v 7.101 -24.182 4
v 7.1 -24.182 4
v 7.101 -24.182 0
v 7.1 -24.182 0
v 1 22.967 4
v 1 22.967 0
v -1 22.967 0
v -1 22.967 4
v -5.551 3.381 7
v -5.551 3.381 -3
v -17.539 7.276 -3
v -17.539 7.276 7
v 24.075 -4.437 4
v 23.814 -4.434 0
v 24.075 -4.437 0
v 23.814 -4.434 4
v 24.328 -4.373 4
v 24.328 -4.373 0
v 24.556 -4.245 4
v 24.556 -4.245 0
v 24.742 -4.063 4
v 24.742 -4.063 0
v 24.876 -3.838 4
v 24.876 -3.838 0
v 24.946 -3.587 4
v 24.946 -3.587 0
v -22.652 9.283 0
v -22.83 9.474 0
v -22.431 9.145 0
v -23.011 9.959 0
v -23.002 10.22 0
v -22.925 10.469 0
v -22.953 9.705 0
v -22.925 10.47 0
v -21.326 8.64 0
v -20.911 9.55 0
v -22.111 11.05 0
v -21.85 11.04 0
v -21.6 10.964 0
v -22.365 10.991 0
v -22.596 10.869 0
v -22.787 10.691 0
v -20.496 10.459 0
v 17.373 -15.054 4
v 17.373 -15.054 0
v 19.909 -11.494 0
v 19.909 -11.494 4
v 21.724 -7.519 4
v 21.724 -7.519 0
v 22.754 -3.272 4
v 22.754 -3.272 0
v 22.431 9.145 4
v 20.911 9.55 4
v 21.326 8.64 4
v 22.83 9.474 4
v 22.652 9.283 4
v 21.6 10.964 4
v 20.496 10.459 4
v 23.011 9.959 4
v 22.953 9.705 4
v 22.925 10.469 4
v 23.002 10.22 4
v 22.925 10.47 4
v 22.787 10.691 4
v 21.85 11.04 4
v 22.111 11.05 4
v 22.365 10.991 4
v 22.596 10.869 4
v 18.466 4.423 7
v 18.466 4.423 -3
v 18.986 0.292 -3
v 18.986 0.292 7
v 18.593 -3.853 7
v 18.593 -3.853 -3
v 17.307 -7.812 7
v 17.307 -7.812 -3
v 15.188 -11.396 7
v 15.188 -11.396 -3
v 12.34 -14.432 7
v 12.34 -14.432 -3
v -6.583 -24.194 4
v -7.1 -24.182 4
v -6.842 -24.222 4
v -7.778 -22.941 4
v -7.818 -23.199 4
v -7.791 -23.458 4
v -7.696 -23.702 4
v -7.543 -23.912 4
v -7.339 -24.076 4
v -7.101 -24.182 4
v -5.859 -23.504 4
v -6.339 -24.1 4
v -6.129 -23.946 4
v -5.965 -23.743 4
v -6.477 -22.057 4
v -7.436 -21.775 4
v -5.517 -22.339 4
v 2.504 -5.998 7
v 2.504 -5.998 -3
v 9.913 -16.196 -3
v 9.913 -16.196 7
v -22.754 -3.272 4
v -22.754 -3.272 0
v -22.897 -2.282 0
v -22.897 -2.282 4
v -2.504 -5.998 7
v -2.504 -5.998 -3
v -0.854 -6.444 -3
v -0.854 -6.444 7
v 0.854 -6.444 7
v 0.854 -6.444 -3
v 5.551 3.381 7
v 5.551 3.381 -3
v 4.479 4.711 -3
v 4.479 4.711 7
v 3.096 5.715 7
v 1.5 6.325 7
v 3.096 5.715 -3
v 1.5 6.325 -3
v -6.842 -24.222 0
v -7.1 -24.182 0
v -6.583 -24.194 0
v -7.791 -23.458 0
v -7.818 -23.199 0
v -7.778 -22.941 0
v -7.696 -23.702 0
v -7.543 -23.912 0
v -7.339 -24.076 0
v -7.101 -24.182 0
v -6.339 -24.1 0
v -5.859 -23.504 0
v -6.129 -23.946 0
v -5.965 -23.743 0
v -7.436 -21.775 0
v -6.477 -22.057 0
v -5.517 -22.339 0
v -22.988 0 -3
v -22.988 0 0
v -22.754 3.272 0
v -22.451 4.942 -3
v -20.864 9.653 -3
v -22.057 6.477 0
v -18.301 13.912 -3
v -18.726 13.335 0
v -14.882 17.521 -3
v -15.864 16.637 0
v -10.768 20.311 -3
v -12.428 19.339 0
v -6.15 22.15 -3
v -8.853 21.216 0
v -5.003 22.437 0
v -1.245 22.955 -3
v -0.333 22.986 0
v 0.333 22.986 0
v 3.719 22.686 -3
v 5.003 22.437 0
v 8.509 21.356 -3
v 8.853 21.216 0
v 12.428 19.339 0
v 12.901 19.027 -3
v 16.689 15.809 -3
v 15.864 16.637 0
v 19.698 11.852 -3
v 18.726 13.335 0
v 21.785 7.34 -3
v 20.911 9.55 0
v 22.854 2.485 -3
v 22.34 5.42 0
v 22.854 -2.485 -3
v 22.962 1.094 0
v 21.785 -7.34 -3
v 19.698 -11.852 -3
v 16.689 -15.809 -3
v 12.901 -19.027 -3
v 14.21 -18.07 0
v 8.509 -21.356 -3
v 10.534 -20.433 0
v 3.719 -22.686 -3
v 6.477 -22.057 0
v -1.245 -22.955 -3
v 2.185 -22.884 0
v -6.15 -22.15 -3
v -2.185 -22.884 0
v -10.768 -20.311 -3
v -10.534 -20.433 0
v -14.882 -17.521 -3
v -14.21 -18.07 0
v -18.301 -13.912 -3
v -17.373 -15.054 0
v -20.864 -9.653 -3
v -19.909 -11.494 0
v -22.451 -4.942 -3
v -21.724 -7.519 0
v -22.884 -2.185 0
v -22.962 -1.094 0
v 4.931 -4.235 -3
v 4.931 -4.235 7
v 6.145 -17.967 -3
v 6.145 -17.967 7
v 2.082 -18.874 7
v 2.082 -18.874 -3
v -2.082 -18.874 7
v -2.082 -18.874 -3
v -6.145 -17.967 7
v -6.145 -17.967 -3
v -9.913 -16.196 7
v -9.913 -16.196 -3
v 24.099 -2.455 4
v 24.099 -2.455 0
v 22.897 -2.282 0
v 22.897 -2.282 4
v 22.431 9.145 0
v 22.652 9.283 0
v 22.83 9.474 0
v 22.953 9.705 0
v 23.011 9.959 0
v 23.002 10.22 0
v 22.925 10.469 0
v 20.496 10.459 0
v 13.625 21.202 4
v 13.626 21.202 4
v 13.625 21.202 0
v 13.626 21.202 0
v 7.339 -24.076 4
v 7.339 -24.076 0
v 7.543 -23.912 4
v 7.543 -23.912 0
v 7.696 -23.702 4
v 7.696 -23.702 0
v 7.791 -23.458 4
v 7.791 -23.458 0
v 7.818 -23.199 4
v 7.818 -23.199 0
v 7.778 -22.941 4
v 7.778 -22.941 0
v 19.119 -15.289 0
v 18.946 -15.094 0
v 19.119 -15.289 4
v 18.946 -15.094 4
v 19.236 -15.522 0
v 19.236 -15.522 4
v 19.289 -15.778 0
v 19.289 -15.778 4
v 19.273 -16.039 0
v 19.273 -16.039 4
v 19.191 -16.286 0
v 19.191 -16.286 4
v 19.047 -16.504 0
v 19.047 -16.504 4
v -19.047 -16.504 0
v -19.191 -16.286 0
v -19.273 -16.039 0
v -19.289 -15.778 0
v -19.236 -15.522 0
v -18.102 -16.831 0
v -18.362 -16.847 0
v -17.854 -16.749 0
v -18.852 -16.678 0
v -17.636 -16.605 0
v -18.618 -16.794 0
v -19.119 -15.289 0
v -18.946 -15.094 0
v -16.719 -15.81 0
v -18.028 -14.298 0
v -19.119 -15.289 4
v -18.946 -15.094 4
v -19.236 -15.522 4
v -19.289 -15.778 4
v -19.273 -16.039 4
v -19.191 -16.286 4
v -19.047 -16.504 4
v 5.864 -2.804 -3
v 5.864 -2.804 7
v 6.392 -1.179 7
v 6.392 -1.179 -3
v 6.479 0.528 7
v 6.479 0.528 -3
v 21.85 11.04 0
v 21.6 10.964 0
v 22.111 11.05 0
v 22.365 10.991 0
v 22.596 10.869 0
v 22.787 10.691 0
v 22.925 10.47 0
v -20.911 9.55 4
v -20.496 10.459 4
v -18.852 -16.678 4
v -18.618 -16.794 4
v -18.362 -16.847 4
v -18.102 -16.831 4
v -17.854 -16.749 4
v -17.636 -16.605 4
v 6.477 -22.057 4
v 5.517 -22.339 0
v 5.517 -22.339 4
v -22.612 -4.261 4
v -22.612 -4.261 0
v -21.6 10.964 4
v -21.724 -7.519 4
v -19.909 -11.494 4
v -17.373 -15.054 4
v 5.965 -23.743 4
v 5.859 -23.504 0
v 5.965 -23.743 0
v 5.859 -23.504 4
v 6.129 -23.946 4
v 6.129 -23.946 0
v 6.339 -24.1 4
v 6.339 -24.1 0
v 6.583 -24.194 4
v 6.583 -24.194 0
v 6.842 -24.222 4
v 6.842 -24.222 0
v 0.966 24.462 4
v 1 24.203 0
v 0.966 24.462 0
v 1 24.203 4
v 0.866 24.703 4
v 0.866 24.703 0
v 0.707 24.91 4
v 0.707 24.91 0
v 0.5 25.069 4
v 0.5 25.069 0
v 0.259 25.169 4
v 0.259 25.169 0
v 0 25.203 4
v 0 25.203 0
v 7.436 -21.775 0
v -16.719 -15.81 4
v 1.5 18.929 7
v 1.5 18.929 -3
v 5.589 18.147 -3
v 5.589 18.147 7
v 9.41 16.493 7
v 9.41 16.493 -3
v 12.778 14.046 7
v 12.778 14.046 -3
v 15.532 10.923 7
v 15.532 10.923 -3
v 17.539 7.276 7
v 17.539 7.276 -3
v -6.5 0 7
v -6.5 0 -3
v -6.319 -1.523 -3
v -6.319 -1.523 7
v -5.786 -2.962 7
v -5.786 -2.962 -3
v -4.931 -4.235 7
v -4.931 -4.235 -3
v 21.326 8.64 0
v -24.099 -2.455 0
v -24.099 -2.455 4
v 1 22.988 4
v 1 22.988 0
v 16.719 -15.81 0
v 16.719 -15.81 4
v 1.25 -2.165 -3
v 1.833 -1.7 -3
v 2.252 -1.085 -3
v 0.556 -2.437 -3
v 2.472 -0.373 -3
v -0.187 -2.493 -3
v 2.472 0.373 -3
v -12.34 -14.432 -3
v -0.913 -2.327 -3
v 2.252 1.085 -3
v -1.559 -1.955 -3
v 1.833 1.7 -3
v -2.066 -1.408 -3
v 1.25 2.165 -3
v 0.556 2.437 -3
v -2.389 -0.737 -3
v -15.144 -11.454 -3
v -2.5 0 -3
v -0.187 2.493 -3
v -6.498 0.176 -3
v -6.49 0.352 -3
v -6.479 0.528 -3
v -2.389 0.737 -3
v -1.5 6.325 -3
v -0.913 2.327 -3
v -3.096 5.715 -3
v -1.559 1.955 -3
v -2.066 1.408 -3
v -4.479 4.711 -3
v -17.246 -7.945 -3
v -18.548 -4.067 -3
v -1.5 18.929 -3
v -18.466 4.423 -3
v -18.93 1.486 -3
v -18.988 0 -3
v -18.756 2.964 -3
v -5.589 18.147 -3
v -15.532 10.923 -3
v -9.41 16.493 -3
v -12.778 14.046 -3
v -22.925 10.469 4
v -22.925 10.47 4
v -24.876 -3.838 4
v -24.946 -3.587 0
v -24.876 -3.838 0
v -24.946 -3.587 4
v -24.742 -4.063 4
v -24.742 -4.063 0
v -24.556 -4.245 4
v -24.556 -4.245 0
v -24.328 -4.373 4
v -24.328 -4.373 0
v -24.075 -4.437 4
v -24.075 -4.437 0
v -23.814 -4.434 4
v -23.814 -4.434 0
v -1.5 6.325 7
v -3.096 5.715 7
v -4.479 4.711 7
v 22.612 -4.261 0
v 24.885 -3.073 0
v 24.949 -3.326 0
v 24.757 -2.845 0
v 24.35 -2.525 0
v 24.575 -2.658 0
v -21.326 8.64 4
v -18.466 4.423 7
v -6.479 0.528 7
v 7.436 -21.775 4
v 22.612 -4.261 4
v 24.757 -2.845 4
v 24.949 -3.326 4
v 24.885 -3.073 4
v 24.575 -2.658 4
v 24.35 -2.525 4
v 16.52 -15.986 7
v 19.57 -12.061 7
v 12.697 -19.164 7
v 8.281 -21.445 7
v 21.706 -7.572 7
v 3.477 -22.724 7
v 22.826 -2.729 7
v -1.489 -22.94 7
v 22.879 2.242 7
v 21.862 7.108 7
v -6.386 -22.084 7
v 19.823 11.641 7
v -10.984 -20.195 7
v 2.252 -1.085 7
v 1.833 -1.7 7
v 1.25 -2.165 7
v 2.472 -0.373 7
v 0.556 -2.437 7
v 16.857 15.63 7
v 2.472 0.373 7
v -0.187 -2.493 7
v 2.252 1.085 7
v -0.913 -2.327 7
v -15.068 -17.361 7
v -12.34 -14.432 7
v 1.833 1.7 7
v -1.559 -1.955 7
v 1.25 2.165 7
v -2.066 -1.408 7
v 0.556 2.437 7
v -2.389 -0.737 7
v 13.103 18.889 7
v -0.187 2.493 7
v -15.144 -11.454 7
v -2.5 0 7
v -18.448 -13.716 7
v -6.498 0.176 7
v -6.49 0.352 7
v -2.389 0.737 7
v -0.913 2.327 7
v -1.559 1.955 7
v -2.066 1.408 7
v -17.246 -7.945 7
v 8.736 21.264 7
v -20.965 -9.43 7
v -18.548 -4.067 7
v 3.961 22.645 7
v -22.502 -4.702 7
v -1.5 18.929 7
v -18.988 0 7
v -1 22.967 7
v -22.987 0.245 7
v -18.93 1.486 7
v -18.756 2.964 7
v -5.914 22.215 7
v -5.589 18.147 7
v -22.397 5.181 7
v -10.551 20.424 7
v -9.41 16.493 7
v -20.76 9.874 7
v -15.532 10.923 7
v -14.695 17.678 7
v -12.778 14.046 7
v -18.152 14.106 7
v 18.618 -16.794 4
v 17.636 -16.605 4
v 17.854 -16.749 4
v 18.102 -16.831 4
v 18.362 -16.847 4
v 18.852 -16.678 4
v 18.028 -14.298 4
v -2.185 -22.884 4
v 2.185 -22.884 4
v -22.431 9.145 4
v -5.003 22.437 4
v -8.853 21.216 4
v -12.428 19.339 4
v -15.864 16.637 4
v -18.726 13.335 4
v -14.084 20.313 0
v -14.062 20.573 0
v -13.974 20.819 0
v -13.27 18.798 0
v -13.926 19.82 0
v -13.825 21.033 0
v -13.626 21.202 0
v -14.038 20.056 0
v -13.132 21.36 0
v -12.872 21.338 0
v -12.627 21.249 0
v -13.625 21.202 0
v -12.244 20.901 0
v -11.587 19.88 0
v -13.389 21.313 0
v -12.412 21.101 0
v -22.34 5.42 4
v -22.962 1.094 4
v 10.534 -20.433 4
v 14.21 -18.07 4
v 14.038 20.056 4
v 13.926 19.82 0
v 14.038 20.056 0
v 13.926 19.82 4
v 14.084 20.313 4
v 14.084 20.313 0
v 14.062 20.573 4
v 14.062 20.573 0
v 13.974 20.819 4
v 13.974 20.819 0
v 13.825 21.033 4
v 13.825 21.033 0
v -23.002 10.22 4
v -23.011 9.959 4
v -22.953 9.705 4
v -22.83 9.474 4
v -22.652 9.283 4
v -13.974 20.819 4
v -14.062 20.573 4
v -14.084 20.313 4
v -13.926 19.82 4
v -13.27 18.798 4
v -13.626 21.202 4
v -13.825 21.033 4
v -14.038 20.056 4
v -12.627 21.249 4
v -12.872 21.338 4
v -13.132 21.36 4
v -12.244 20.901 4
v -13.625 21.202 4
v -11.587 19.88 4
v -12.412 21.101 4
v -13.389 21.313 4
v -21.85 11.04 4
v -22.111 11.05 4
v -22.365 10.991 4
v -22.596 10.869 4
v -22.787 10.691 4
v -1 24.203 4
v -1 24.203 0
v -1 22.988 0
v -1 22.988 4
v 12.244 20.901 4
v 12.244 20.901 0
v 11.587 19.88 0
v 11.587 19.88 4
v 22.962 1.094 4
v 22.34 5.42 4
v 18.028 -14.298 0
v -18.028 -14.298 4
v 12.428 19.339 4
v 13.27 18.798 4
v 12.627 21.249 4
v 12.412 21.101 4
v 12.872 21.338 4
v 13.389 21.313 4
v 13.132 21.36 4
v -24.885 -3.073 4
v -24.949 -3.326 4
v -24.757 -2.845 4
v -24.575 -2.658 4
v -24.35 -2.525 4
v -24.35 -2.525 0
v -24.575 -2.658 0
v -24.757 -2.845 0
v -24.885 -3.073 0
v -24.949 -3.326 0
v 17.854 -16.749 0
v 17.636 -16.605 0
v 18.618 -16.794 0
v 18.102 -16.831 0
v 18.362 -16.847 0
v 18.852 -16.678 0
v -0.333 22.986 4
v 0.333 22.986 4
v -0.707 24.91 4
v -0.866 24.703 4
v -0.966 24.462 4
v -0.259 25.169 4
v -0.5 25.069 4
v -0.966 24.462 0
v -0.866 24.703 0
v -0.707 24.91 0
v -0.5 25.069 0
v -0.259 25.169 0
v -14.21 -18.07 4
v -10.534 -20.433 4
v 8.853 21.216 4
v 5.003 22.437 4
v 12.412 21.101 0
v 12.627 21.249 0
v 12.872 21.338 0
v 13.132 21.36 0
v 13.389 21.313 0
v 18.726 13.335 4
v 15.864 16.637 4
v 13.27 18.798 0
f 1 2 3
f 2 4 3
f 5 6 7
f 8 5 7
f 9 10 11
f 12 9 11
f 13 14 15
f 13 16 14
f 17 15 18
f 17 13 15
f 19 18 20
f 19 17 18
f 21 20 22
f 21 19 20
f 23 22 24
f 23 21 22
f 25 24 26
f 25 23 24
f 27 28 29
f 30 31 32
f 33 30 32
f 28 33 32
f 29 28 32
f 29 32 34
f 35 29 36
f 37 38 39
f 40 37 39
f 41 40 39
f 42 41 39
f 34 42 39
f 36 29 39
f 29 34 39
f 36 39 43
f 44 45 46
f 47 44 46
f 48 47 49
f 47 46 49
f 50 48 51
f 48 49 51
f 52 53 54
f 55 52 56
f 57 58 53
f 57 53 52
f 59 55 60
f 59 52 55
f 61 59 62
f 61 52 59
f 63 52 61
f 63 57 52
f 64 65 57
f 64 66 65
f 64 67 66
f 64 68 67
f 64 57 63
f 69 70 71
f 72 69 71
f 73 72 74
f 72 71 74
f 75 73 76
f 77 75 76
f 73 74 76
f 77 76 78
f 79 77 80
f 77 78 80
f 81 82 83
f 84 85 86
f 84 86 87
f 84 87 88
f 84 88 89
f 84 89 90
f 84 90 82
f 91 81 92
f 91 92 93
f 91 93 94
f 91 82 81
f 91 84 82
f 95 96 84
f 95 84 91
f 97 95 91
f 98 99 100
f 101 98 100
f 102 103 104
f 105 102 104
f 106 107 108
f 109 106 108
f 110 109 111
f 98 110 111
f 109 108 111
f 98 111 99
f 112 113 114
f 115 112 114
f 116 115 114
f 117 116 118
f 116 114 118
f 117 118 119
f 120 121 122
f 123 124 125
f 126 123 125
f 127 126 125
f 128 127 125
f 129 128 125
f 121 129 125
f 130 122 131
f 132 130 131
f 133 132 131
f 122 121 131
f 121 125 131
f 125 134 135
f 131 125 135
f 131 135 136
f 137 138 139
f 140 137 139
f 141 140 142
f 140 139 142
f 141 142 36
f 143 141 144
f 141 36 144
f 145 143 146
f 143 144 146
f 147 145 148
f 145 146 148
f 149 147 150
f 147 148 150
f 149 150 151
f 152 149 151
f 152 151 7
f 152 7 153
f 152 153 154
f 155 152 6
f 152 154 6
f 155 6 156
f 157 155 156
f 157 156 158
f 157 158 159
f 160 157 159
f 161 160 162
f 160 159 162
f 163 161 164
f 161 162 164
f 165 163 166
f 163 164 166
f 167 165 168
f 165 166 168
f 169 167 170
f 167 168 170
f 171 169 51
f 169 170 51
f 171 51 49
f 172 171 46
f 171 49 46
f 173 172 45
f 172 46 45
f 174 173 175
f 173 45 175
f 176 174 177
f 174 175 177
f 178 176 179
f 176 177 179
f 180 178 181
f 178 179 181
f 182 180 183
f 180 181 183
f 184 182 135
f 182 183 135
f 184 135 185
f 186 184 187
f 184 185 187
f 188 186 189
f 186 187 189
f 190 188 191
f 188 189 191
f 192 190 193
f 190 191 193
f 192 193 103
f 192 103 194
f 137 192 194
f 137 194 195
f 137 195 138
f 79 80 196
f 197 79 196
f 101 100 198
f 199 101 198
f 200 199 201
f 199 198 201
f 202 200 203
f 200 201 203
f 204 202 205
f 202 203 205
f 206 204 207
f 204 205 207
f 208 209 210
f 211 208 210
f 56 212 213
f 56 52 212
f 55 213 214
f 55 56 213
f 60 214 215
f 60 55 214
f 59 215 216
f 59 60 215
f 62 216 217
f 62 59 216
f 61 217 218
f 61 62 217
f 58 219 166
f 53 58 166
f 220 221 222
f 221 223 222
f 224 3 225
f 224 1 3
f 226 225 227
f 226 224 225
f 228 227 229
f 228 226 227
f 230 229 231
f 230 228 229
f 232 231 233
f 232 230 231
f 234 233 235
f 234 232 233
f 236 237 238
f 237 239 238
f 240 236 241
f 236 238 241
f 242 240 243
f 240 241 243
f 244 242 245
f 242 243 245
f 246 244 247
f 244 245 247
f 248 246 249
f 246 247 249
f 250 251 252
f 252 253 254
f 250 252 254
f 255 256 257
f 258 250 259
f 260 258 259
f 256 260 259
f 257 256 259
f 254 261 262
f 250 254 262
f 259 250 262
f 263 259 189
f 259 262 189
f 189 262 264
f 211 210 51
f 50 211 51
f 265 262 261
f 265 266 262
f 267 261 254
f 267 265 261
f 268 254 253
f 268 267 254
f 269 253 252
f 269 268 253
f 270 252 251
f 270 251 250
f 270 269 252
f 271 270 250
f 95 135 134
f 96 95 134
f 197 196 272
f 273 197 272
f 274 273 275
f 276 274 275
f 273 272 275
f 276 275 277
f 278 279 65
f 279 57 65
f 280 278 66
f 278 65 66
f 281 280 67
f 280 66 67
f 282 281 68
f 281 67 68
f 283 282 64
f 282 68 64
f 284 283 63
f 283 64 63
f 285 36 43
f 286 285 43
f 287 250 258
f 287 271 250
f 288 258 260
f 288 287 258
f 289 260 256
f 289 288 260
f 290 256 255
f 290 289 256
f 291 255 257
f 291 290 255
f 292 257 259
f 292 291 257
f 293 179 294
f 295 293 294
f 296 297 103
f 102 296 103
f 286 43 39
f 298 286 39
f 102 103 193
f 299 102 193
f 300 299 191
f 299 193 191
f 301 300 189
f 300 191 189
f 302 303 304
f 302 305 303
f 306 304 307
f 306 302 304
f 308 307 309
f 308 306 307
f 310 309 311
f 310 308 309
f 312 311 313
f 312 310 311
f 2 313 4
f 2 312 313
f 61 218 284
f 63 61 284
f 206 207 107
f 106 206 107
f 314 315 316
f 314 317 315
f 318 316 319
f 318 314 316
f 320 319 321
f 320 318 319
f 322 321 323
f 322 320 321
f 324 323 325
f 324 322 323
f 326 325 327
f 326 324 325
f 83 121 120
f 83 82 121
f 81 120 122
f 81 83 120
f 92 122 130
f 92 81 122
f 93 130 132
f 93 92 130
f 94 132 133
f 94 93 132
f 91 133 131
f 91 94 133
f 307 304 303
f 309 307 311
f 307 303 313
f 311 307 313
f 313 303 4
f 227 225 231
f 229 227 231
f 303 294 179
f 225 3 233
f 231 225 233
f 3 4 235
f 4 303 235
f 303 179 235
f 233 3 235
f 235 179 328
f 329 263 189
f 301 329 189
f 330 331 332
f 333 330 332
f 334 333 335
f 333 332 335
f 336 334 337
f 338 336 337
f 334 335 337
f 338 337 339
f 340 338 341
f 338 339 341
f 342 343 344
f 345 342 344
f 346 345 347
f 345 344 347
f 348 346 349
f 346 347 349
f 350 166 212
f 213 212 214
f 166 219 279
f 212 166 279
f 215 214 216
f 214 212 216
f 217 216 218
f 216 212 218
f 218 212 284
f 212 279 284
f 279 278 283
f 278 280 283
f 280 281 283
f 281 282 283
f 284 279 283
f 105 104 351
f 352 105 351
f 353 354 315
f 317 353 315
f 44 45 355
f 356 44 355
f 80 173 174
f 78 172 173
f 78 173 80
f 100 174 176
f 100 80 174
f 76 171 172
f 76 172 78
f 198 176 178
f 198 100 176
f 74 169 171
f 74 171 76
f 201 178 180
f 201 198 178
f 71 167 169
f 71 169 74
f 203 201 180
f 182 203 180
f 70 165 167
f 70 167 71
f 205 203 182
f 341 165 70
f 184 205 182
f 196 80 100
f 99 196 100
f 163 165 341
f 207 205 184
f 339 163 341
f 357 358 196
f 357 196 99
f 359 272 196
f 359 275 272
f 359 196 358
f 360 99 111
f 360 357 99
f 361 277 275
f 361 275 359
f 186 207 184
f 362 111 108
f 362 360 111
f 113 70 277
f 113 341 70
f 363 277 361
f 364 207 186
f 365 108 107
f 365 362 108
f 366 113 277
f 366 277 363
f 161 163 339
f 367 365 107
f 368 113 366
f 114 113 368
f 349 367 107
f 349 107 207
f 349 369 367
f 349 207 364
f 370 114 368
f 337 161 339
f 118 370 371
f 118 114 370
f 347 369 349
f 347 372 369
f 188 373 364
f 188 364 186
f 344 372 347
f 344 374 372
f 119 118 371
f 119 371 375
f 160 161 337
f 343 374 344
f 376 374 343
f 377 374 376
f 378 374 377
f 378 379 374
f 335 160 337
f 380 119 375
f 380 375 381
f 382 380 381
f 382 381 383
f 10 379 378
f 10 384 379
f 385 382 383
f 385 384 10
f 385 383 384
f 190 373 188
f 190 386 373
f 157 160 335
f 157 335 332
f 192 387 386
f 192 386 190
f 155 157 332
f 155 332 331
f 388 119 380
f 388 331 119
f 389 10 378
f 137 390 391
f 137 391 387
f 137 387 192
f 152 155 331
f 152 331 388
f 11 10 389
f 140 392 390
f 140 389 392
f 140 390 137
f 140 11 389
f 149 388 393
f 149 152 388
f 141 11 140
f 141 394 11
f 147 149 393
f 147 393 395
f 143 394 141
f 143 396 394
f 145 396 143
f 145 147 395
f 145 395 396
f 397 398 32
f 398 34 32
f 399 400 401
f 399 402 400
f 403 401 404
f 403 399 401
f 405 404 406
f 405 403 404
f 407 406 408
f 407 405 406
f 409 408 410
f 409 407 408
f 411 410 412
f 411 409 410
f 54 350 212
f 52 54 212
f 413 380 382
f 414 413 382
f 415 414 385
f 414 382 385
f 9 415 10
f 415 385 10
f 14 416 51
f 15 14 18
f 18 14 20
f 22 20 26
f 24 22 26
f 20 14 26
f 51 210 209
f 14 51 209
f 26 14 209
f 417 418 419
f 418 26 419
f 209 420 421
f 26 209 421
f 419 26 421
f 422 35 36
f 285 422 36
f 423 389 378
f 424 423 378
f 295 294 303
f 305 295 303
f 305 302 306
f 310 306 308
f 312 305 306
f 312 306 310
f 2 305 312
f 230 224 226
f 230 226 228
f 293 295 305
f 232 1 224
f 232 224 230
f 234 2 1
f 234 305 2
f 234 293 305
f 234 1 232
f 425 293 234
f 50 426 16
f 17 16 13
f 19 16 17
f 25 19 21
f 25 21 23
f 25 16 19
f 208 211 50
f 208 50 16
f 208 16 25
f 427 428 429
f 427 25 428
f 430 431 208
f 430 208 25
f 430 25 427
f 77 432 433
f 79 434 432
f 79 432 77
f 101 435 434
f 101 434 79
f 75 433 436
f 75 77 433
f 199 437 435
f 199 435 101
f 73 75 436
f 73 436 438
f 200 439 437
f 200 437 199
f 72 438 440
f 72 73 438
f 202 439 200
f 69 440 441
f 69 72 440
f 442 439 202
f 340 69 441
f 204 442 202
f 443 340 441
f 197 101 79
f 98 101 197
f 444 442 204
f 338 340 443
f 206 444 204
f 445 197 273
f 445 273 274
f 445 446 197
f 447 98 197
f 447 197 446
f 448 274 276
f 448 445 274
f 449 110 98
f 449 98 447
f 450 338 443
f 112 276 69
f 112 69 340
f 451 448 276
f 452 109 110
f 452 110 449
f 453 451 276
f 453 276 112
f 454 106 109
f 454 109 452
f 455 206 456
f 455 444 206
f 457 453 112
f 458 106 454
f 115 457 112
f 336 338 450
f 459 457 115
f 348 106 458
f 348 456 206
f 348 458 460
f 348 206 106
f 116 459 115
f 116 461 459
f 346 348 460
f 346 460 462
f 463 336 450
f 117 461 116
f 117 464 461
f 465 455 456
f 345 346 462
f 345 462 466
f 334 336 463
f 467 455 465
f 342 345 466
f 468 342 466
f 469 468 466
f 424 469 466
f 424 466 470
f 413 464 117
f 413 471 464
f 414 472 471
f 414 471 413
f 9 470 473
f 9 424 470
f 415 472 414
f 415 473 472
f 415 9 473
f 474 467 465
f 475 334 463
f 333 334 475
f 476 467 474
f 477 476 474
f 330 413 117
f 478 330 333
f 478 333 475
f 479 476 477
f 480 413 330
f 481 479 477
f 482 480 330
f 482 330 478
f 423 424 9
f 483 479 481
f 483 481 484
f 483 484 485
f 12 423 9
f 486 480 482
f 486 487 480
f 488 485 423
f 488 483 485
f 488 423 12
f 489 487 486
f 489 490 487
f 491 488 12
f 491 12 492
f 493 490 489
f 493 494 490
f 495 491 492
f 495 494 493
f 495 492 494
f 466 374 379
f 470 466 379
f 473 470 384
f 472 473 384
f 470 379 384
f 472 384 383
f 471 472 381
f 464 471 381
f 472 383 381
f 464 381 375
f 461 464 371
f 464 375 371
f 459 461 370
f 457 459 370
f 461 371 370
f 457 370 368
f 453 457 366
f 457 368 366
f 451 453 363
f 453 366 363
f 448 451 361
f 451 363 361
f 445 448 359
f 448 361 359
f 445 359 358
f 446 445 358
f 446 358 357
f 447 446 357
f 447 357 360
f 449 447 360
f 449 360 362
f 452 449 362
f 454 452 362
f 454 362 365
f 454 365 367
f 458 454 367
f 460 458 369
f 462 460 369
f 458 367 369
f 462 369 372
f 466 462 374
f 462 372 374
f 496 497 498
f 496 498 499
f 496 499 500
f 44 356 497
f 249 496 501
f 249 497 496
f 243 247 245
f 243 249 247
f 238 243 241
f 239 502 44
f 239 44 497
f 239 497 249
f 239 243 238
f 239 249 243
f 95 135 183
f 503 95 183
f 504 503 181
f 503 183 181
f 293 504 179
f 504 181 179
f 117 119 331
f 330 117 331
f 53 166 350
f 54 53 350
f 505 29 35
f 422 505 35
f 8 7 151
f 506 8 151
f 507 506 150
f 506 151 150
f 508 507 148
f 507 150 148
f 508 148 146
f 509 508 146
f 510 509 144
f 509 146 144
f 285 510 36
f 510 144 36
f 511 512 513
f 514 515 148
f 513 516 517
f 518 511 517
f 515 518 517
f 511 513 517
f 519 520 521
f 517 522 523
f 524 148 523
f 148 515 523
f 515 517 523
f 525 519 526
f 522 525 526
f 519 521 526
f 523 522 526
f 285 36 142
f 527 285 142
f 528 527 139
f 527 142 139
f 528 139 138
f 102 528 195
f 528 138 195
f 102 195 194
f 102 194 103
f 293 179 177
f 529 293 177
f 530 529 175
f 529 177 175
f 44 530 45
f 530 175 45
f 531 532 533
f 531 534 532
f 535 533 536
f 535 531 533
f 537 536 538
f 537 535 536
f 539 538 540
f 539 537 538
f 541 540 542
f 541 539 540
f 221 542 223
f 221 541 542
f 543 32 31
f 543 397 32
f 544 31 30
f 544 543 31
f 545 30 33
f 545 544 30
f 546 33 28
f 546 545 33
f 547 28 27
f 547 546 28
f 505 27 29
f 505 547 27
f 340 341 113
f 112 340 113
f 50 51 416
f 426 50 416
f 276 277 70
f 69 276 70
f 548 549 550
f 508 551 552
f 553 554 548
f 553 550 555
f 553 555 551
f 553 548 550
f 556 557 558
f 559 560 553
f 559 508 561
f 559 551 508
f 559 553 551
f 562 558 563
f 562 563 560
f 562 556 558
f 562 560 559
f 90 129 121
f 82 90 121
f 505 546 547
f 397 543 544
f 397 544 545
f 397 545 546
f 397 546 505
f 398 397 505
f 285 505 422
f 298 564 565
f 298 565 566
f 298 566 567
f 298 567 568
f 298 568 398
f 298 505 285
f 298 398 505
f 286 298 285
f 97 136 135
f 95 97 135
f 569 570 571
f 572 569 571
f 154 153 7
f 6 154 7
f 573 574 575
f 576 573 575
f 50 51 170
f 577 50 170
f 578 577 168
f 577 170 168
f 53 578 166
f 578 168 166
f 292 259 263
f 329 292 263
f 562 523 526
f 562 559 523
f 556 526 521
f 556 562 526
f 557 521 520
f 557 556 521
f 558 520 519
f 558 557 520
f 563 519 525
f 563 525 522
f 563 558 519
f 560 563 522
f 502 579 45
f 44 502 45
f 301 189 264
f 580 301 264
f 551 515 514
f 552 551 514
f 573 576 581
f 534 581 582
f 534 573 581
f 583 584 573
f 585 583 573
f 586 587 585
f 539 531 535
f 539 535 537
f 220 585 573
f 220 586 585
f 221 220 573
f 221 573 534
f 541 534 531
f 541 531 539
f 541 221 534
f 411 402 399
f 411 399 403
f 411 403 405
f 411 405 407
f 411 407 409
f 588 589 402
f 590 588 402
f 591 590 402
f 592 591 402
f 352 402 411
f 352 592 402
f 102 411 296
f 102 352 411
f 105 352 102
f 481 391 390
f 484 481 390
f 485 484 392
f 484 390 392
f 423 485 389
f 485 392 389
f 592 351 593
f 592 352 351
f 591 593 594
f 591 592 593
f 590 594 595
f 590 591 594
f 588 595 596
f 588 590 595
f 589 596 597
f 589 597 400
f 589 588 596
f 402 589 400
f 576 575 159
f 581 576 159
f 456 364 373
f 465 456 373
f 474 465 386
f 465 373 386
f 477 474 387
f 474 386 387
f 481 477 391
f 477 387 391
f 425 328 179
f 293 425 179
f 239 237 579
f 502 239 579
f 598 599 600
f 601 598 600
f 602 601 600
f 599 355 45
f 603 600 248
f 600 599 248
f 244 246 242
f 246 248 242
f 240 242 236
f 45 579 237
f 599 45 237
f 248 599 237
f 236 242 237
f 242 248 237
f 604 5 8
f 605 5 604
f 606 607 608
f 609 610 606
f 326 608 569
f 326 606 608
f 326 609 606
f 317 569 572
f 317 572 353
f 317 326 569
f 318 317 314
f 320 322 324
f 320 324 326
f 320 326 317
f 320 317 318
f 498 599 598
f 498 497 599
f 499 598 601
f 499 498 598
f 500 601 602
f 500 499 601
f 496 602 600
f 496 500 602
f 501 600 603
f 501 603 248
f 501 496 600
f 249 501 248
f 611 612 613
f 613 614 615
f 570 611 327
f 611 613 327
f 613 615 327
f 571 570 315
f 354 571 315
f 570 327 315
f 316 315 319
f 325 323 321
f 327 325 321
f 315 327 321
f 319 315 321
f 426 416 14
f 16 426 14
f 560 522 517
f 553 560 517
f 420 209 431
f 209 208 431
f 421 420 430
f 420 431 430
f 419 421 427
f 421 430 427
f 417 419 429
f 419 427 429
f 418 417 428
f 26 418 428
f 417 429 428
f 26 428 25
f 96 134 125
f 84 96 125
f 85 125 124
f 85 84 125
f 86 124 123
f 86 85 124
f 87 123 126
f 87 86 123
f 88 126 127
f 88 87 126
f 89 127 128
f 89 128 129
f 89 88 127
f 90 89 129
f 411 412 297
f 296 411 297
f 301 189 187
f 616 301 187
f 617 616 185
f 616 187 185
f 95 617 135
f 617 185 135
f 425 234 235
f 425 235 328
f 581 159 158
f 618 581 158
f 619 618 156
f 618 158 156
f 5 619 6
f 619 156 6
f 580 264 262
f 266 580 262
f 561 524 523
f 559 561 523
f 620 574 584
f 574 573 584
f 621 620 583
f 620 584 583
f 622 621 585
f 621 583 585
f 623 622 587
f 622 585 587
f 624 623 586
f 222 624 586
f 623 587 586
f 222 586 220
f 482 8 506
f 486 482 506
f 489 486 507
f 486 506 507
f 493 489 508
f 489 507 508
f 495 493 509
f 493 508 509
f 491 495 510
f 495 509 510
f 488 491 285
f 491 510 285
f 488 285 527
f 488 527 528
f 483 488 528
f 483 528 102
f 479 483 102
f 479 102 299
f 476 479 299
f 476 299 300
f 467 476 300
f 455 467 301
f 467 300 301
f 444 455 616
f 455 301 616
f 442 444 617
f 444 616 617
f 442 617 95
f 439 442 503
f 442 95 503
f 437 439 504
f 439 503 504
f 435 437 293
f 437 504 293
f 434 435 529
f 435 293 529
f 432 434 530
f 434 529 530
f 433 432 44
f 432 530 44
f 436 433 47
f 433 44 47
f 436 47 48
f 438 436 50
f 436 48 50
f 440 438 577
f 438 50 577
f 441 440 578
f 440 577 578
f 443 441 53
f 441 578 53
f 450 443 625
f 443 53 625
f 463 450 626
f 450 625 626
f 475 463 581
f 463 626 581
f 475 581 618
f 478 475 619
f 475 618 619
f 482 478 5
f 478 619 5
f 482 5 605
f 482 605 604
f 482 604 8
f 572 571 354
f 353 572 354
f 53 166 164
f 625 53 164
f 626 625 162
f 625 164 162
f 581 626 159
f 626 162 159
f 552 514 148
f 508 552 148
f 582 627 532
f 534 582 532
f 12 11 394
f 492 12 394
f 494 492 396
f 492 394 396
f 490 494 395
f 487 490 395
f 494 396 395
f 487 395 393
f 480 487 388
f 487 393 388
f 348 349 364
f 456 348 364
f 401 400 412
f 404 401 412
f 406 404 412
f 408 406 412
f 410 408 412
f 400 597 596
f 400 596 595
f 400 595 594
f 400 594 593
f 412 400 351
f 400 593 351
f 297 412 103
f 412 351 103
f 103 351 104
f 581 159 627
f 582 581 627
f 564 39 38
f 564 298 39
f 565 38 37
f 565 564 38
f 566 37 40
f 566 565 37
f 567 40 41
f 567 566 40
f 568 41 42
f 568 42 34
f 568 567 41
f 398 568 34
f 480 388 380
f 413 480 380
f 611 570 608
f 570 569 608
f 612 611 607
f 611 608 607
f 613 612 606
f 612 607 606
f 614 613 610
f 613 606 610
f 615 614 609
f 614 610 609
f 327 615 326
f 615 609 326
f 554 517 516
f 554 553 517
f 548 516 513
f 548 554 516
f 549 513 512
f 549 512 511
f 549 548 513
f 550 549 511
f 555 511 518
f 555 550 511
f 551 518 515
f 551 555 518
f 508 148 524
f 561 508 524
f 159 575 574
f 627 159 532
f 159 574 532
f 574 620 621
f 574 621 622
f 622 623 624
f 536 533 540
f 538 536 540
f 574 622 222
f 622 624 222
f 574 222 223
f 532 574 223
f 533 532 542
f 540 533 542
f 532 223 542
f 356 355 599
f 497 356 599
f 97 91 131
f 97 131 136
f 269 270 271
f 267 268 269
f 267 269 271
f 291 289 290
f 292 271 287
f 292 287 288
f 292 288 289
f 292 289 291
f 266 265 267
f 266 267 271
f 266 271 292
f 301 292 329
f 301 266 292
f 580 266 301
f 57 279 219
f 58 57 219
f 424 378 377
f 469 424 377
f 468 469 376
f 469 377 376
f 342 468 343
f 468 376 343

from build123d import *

# Parameters (mm, degrees)
BOSS_EXTRUDE1_DEPTH    = 4
BOSS_EXTRUDE1_2_DEPTH  = 4
BOSS_EXTRUDE1_3_DEPTH  = 4
BOSS_EXTRUDE1_4_DEPTH  = 4
BOSS_EXTRUDE1_5_DEPTH  = 4
BOSS_EXTRUDE1_6_DEPTH  = 4
BOSS_EXTRUDE1_7_DEPTH  = 4
BOSS_EXTRUDE1_8_DEPTH  = 4
BOSS_EXTRUDE1_9_DEPTH  = 4
BOSS_EXTRUDE1_10_DEPTH = 4
BOSS_EXTRUDE1_11_DEPTH = 4
BOSS_EXTRUDE1_12_DEPTH = 4
SKETCH5_R              = 22.988388863
BOSS_EXTRUDE3_DEPTH    = 3
SKETCH6_R              = 22.988388863
BOSS_EXTRUDE4_DEPTH    = 3
SKETCH7_R              = 2.5
CUT_EXTRUDE1_DEPTH     = 10
CUT_EXTRUDE2_DEPTH     = 10
FILLET1_R              = 1
FILLET2_R              = 1
FILLET3_R              = 1
FILLET4_R              = 1
FILLET5_R              = 1
FILLET6_R              = 1
FILLET7_R              = 1
FILLET8_R              = 1
FILLET9_R              = 1
FILLET10_R             = 1
FILLET11_R             = 1


with BuildPart() as part:
    # Sketch2 → Boss-Extrude1 (new body)
    with BuildSketch(Plane.XY):
        with BuildLine():
            Line((-1, 24.966628453), (-1, 22.988388863))
            Line((-1, 22.988388863), (1, 22.988388863))
            Line((1, 22.988388863), (1, 24.966628453))
            ThreePointArc((1, 24.966628453), (0, 25.20269643), (-1, 24.966628453))
        make_face()
    extrude(amount=BOSS_EXTRUDE1_DEPTH)

    # Fillet1
    fillet1_edges = [part.edges().sort_by_distance(p)[0] for p in [
        (-1, 24.966628453, 2),
        (1, 24.966628453, 2),
    ]]
    fillet(fillet1_edges, radius=FILLET1_R - 0.0001)  # a hair under: the kernel refuses the full size


with BuildPart() as body_2:
    # Sketch2 → Boss-Extrude1 2 (new body)
    with BuildSketch(Plane.XY):
        with BuildLine():
            Line((-13.269714879, 18.798422527), (-12.428461559, 19.339063208))
            Line((-12.428461559, 19.339063208), (-11.587207814, 19.879704162))
            Line((-11.587207814, 19.879704162), (-12.656724883, 21.543905206))
            ThreePointArc((-12.656724883, 21.543905206), (-13.6256064, 21.201857409), (-14.339231949, 20.462623571))
            Line((-14.339231949, 20.462623571), (-13.269714879, 18.798422527))
        make_face()
    extrude(amount=BOSS_EXTRUDE1_2_DEPTH)

    # Fillet2
    fillet2_edges = [body_2.edges().sort_by_distance(p)[0] for p in [
        (-14.339231949, 20.462623571, 2),
        (-12.656724883, 21.543905206, 2),
    ]]
    fillet(fillet2_edges, radius=FILLET2_R - 0.0001)  # a hair under: the kernel refuses the full size


with BuildPart() as body_3:
    # Sketch2 → Boss-Extrude1 3 (new body)
    with BuildSketch(Plane.XY):
        with BuildLine():
            Line((1, 22.966628453), (-1, 22.966628453))
            ThreePointArc((-1, 22.966628453), (-6.954904914, 21.911077567), (-12.428461559, 19.339063208))
            ThreePointArc((-12.428461559, 19.339063208), (-17.373465046, 15.054193263), (-20.910973859, 9.549722234))
            ThreePointArc((-20.910973859, 9.549722234), (-22.754400197, 3.271588939), (-22.754400179, -3.271589061))
            ThreePointArc((-22.754400179, -3.271589061), (-20.91097412, -9.549721663), (-17.373465524, -15.054192711))
            ThreePointArc((-17.373465524, -15.054192711), (-12.428461917, -19.339062978), (-6.47657825, -22.057197389))
            ThreePointArc((-6.47657825, -22.057197389), (0, -22.988388863), (6.47657825, -22.057197389))
            ThreePointArc((6.47657825, -22.057197389), (12.42846186, -19.339063015), (17.373465435, -15.054192814))
            ThreePointArc((17.373465435, -15.054192814), (20.910974105, -9.549721696), (22.754400188, -3.271588999))
            ThreePointArc((22.754400188, -3.271588999), (22.754400262, 3.271588485), (20.910974266, 9.549721344))
            ThreePointArc((20.910974266, 9.549721344), (17.373465478, 15.054192764), (12.428461848, 19.339063022))
            ThreePointArc((12.428461848, 19.339063022), (6.954905078, 21.911077515), (1, 22.966628453))
        make_face()
    extrude(amount=BOSS_EXTRUDE1_3_DEPTH)

    # Sketch5 → Boss-Extrude3 (add)
    with BuildSketch(Plane.XY.offset(4)):
        with Locations(Location((0, 0, 0), (0, 0, 92.493165793))):
            Circle(SKETCH5_R)
    extrude(amount=BOSS_EXTRUDE3_DEPTH)

    # Sketch6 → Boss-Extrude4 (add)
    with BuildSketch(Plane(origin=(0, 0, 0), x_dir=(-1, 0, 0), z_dir=(0, 0, -1))):
        Circle(SKETCH6_R)
    extrude(amount=BOSS_EXTRUDE4_DEPTH)

    # Sketch7 → Cut-Extrude1 (cut)
    with BuildSketch(Plane(origin=(0, 0, -3), x_dir=(-1, 0, 0), z_dir=(0, 0, -1))):
        Circle(SKETCH7_R)
    extrude(amount=-CUT_EXTRUDE1_DEPTH, mode=Mode.SUBTRACT)

    # Sketch8 → Cut-Extrude2 (cut)
    with BuildSketch(Plane(origin=(0, 0, -3), x_dir=(-1, 0, 0), z_dir=(0, 0, -1))):
        with BuildLine():
            ThreePointArc((-5.551484059, 3.38097985), (-3.82060414, 5.258610463), (-1.5, 6.32455532))
            Line((-1.5, 6.32455532), (-1.5, 18.929049411))
            ThreePointArc((-1.5, 18.929049411), (-11.161094938, 15.361929286), (-17.539070298, 7.27598273))
            Line((-17.539070298, 7.27598273), (-5.551484059, 3.38097985))
        make_face()
        with BuildLine():
            Line((1.5, 18.929049411), (1.5, 6.32455532))
            ThreePointArc((1.5, 6.32455532), (3.82060414, 5.258610463), (5.551484059, 3.38097985))
            Line((5.551484059, 3.38097985), (17.539070298, 7.27598273))
            ThreePointArc((17.539070298, 7.27598273), (11.161094938, 15.361929286), (1.5, 18.929049411))
        make_face()
        with BuildLine():
            Line((18.466121281, 4.422813181), (6.478535042, 0.527810301))
            ThreePointArc((6.478535042, 0.527810301), (6.494631543, 0.264123294), (6.5, 0))
            ThreePointArc((6.5, 0), (6.095143064, -2.258147699), (4.931005836, -4.234994858))
            Line((4.931005836, -4.234994858), (12.339741575, -14.432244782))
            ThreePointArc((12.339741575, -14.432244782), (17.246314434, -7.945033043), (18.988388863, 0))
            ThreePointArc((18.988388863, 0), (18.857369955, 2.226771197), (18.466121281, 4.422813181))
        make_face()
        with BuildLine():
            ThreePointArc((2.503954853, -5.998350614), (0, -6.5), (-2.503954853, -5.998350614))
            Line((-2.503954853, -5.998350614), (-9.912690592, -16.195600539))
            ThreePointArc((-9.912690592, -16.195600539), (0, -18.988388863), (9.912690592, -16.195600539))
            Line((9.912690592, -16.195600539), (2.503954853, -5.998350614))
        make_face()
        with BuildLine():
            ThreePointArc((-4.931005836, -4.234994858), (-6.181867356, -2.008610463), (-6.478535042, 0.527810301))
            Line((-6.478535042, 0.527810301), (-18.466121281, 4.422813181))
            ThreePointArc((-18.466121281, 4.422813181), (-18.059030962, -5.867734854), (-12.339741575, -14.432244782))
            Line((-12.339741575, -14.432244782), (-4.931005836, -4.234994858))
        make_face()
    extrude(amount=-CUT_EXTRUDE2_DEPTH, mode=Mode.SUBTRACT)


with BuildPart() as body_4:
    # Sketch2 → Boss-Extrude1 4 (new body)
    with BuildSketch(Plane.XY):
        with BuildLine():
            Line((12.656724883, 21.543905206), (11.587207814, 19.879704162))
            Line((11.587207814, 19.879704162), (12.428461848, 19.339063022))
            Line((12.428461848, 19.339063022), (13.269714879, 18.798422527))
            Line((13.269714879, 18.798422527), (14.339231949, 20.462623571))
            ThreePointArc((14.339231949, 20.462623571), (13.6256064, 21.201857409), (12.656724883, 21.543905206))
        make_face()
    extrude(amount=BOSS_EXTRUDE1_4_DEPTH)

    # Fillet8
    fillet8_edges = [body_4.edges().sort_by_distance(p)[0] for p in [
        (14.339231949, 20.462623571, 2),
        (12.656724883, 21.543905206, 2),
    ]]
    fillet(fillet8_edges, radius=FILLET8_R - 0.0001)  # a hair under: the kernel refuses the full size


with BuildPart() as body_5:
    # Sketch2 → Boss-Extrude1 5 (new body)
    with BuildSketch(Plane.XY):
        with BuildLine():
            Line((-20.910973859, 9.549722234), (-20.495559018, 10.459353854))
            Line((-20.495559018, 10.459353854), (-22.295029044, 11.281144279))
            ThreePointArc((-22.295029044, 11.281144279), (-22.925179042, 10.469578465), (-23.12585907, 9.461880288))
            Line((-23.12585907, 9.461880288), (-21.326389044, 8.640089863))
            Line((-21.326389044, 8.640089863), (-20.910973859, 9.549722234))
        make_face()
    extrude(amount=BOSS_EXTRUDE1_5_DEPTH)

    # Fillet3
    fillet3_edges = [body_5.edges().sort_by_distance(p)[0] for p in [
        (-23.12585907, 9.461880288, 2),
        (-22.295029044, 11.281144279, 2),
    ]]
    fillet(fillet3_edges, radius=FILLET3_R - 0.0001)  # a hair under: the kernel refuses the full size


with BuildPart() as body_6:
    # Sketch2 → Boss-Extrude1 6 (new body)
    with BuildSketch(Plane.XY):
        with BuildLine():
            Line((22.295029044, 11.281144279), (20.495559018, 10.459353854))
            Line((20.495559018, 10.459353854), (20.910974266, 9.549721344))
            Line((20.910974266, 9.549721344), (21.326389044, 8.640089863))
            Line((21.326389044, 8.640089863), (23.12585907, 9.461880288))
            ThreePointArc((23.12585907, 9.461880288), (22.925179042, 10.469578465), (22.295029044, 11.281144279))
        make_face()
    extrude(amount=BOSS_EXTRUDE1_6_DEPTH)

    # Fillet9
    fillet9_edges = [body_6.edges().sort_by_distance(p)[0] for p in [
        (22.295029044, 11.281144279, 2),
        (23.12585907, 9.461880288, 2),
    ]]
    fillet(fillet9_edges, radius=FILLET9_R - 0.0001)  # a hair under: the kernel refuses the full size


with BuildPart() as body_7:
    # Sketch2 → Boss-Extrude1 7 (new body)
    with BuildSketch(Plane.XY):
        with BuildLine():
            Line((-22.754400179, -3.271589061), (-22.896715049, -2.281767401))
            Line((-22.896715049, -2.281767401), (-24.854819012, -2.563300249))
            ThreePointArc((-24.854819012, -2.563300249), (-24.94616932, -3.586717667), (-24.570189336, -4.542943132))
            Line((-24.570189336, -4.542943132), (-22.612085372, -4.261410285))
            Line((-22.612085372, -4.261410285), (-22.754400179, -3.271589061))
        make_face()
    extrude(amount=BOSS_EXTRUDE1_7_DEPTH)

    # Fillet4
    fillet4_edges = [body_7.edges().sort_by_distance(p)[0] for p in [
        (-24.854819012, -2.563300249, 2),
        (-24.570189336, -4.542943132, 2),
    ]]
    fillet(fillet4_edges, radius=FILLET4_R - 0.0001)  # a hair under: the kernel refuses the full size


with BuildPart() as body_8:
    # Sketch2 → Boss-Extrude1 8 (new body)
    with BuildSketch(Plane.XY):
        with BuildLine():
            Line((24.854819012, -2.563300249), (22.896715049, -2.281767401))
            Line((22.896715049, -2.281767401), (22.754400188, -3.271588999))
            Line((22.754400188, -3.271588999), (22.612085372, -4.261410285))
            Line((22.612085372, -4.261410285), (24.570189336, -4.542943132))
            ThreePointArc((24.570189336, -4.542943132), (24.94616932, -3.586717667), (24.854819012, -2.563300249))
        make_face()
    extrude(amount=BOSS_EXTRUDE1_8_DEPTH)

    # Fillet10
    fillet10_edges = [body_8.edges().sort_by_distance(p)[0] for p in [
        (24.854819012, -2.563300249, 2),
        (24.570189336, -4.542943132, 2),
    ]]
    fillet(fillet10_edges, radius=FILLET10_R - 0.0001)  # a hair under: the kernel refuses the full size


with BuildPart() as body_9:
    # Sketch2 → Boss-Extrude1 9 (new body)
    with BuildSketch(Plane.XY):
        with BuildLine():
            Line((-17.373465524, -15.054192711), (-18.028325832, -14.298443628))
            Line((-18.028325832, -14.298443628), (-19.52337956, -15.593915058))
            ThreePointArc((-19.52337956, -15.593915058), (-19.0469271, -16.504256282), (-18.213658092, -17.105414207))
            Line((-18.213658092, -17.105414207), (-16.718604364, -15.809942777))
            Line((-16.718604364, -15.809942777), (-17.373465524, -15.054192711))
        make_face()
    extrude(amount=BOSS_EXTRUDE1_9_DEPTH)

    # Fillet5
    fillet5_edges = [body_9.edges().sort_by_distance(p)[0] for p in [
        (-18.213658092, -17.105414207, 2),
        (-19.52337956, -15.593915058, 2),
    ]]
    fillet(fillet5_edges, radius=FILLET5_R - 0.0001)  # a hair under: the kernel refuses the full size


with BuildPart() as body_10:
    # Sketch2 → Boss-Extrude1 10 (new body)
    with BuildSketch(Plane.XY):
        with BuildLine():
            Line((-6.47657825, -22.057197389), (-7.436070546, -21.775465031))
            Line((-7.436070546, -21.775465031), (-7.993405043, -23.673572019))
            ThreePointArc((-7.993405043, -23.673572019), (-7.100420105, -24.181810141), (-6.074419096, -24.237037132))
            Line((-6.074419096, -24.237037132), (-5.517084598, -22.338930145))
            Line((-5.517084598, -22.338930145), (-6.47657825, -22.057197389))
        make_face()
    extrude(amount=BOSS_EXTRUDE1_10_DEPTH)

    # Fillet6
    fillet6_edges = [body_10.edges().sort_by_distance(p)[0] for p in [
        (-7.993405043, -23.673572019, 2),
        (-6.074419096, -24.237037132, 2),
    ]]
    fillet(fillet6_edges, radius=FILLET6_R - 0.0001)  # a hair under: the kernel refuses the full size


with BuildPart() as body_11:
    # Sketch2 → Boss-Extrude1 11 (new body)
    with BuildSketch(Plane.XY):
        with BuildLine():
            Line((19.52337956, -15.593915058), (18.028325832, -14.298443628))
            Line((18.028325832, -14.298443628), (17.373465435, -15.054192814))
            Line((17.373465435, -15.054192814), (16.718604364, -15.809942777))
            Line((16.718604364, -15.809942777), (18.213658092, -17.105414207))
            ThreePointArc((18.213658092, -17.105414207), (19.0469271, -16.504256282), (19.52337956, -15.593915058))
        make_face()
    extrude(amount=BOSS_EXTRUDE1_11_DEPTH)

    # Fillet11
    fillet11_edges = [body_11.edges().sort_by_distance(p)[0] for p in [
        (18.213658092, -17.105414207, 2),
        (19.52337956, -15.593915058, 2),
    ]]
    fillet(fillet11_edges, radius=FILLET11_R - 0.0001)  # a hair under: the kernel refuses the full size


with BuildPart() as body_12:
    # Sketch2 → Boss-Extrude1 12 (new body)
    with BuildSketch(Plane.XY):
        with BuildLine():
            Line((6.47657825, -22.057197389), (5.517084598, -22.338930145))
            Line((5.517084598, -22.338930145), (6.074419096, -24.237037132))
            ThreePointArc((6.074419096, -24.237037132), (7.100420105, -24.181810141), (7.993405043, -23.673572019))
            Line((7.993405043, -23.673572019), (7.436070546, -21.775465031))
            Line((7.436070546, -21.775465031), (6.47657825, -22.057197389))
        make_face()
    extrude(amount=BOSS_EXTRUDE1_12_DEPTH)

    # Fillet7
    fillet7_edges = [body_12.edges().sort_by_distance(p)[0] for p in [
        (7.993405043, -23.673572019, 2),
        (6.074419096, -24.237037132, 2),
    ]]
    fillet(fillet7_edges, radius=FILLET7_R - 0.0001)  # a hair under: the kernel refuses the full size


solid = Compound([part.part, body_2.part, body_3.part, body_4.part, body_5.part, body_6.part, body_7.part, body_8.part, body_9.part, body_10.part, body_11.part, body_12.part])
